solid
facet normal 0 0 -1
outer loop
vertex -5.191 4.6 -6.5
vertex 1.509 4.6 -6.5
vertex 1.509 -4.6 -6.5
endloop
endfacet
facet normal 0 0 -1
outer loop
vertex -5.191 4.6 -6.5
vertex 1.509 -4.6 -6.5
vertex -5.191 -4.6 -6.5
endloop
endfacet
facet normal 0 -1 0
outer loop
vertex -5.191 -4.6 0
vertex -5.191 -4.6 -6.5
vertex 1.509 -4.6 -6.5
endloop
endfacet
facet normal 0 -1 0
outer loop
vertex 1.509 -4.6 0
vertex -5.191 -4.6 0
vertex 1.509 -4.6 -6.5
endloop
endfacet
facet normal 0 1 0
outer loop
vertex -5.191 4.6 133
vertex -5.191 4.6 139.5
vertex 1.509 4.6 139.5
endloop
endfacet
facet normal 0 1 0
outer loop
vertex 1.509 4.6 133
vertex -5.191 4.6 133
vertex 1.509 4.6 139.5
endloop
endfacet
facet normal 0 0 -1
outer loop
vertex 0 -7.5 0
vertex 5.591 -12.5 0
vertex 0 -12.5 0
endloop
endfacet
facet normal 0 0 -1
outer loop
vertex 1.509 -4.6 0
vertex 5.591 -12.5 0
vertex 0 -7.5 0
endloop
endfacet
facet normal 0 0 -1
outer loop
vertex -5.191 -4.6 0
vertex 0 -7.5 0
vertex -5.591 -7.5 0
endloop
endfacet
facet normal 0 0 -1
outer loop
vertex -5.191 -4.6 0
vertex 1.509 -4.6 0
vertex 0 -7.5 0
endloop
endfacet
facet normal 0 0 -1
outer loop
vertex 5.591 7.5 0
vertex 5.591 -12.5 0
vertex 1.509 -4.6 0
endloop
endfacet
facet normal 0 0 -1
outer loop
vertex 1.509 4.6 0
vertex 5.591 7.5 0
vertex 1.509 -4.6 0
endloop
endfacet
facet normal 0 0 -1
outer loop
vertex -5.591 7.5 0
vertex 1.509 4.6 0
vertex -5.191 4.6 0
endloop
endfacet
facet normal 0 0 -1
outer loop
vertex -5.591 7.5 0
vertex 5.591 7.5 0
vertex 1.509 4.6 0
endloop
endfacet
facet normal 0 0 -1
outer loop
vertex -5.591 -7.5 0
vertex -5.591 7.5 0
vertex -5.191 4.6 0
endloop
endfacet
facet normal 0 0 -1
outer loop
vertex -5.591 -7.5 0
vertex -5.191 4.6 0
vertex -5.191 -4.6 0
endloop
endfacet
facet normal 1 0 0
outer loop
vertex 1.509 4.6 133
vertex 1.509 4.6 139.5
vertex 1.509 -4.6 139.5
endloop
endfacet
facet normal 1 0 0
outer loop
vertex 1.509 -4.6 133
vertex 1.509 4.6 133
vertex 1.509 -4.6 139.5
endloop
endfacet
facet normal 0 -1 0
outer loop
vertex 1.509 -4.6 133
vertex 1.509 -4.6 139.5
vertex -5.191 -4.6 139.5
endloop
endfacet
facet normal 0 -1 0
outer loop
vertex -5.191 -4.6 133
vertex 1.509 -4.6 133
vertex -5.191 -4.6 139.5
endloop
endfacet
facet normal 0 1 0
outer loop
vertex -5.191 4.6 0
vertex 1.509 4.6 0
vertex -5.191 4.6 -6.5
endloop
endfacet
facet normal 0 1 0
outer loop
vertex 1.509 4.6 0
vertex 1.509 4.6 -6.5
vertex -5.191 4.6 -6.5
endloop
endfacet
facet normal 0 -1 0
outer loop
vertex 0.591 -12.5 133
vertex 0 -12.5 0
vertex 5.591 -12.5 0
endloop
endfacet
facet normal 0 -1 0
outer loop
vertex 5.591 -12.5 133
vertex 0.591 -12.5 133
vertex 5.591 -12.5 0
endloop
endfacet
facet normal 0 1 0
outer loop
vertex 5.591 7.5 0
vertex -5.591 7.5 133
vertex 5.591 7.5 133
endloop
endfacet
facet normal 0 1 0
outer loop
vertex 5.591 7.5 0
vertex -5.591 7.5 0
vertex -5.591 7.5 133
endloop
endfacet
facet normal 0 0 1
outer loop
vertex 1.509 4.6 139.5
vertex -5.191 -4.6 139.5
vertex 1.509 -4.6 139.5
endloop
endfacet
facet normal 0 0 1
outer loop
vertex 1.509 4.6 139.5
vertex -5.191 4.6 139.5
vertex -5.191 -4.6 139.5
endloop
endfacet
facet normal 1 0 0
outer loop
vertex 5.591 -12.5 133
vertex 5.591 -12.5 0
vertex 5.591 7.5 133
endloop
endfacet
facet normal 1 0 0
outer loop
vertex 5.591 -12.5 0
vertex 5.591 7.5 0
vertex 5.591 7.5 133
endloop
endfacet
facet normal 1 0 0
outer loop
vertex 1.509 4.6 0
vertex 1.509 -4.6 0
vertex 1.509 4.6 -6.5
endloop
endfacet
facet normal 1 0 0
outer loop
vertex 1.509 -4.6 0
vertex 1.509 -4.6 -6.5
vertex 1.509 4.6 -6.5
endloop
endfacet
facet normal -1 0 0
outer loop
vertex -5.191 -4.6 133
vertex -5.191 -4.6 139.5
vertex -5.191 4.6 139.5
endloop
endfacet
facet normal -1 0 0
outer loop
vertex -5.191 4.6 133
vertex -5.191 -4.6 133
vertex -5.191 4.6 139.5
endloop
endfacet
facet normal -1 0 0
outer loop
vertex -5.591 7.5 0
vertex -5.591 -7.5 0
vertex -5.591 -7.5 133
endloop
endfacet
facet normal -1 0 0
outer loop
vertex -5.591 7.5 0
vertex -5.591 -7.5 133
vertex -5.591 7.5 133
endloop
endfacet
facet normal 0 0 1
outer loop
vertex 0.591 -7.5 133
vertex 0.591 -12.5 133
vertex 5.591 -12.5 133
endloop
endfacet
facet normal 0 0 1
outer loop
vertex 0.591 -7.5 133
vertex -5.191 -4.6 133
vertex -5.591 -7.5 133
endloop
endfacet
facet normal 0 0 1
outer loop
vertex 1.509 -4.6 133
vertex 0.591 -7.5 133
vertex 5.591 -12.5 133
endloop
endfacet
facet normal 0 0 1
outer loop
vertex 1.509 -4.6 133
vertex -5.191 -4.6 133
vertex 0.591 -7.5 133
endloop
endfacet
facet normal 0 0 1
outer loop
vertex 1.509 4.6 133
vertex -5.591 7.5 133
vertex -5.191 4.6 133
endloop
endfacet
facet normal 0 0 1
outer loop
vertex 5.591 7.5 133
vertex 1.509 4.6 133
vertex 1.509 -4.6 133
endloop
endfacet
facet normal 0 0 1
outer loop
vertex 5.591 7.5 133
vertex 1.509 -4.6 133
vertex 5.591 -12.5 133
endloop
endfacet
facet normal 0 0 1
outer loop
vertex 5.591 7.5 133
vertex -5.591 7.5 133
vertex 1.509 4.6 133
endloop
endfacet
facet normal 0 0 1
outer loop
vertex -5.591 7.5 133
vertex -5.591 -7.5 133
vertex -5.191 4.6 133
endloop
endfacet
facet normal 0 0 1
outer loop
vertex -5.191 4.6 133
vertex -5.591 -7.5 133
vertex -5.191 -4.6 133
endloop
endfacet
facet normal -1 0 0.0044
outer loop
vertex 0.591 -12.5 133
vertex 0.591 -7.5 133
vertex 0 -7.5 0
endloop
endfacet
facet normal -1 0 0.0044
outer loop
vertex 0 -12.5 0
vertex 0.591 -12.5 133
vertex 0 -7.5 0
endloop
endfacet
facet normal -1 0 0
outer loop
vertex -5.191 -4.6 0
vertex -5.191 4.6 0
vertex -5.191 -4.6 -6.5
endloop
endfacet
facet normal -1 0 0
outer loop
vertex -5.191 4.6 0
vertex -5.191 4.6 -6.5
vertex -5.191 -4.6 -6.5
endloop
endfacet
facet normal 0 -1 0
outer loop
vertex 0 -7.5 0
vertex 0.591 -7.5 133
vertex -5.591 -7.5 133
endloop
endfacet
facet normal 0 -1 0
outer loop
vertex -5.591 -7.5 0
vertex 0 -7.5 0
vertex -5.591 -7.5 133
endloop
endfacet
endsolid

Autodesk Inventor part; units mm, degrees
ref_plane "YZ Plane" through (0, 0, 0) normal (1, 0, 0) x (0, 1, 0)
ref_plane "XZ Plane" through (0, 0, 0) normal (0, 1, 0) x (-1, 0, 0)
ref_plane "XY Plane" through (0, 0, 0) normal (0, 0, 1) x (1, 0, 0)
sketch "Sketch1" plane through (0, 0, 0) normal (0, 0, 1) x (1, 0, 0)
  line L0 (-5.591, -7.5) -> (-5.591, 7.5)
  line L1 (-5.591, 7.5) -> (5.591, 7.5)
  line L2 (5.591, 7.5) -> (5.591, -7.5)
  line L3 (5.591, -7.5) -> (-5.591, -7.5)
  line L4 (-5.591, -7.5) -> (5.591, 7.5) construction
  line L5 (-5.591, 7.5) -> (5.591, -7.5) construction
  point P0 (0, 0)
  dimension "d0" = 15
  dimension "d1" = 11.182
extrude "Extrusion1" add sketch "Sketch1" along normal blind 133
sketch "Sketch2" plane through (0, 0, 133) normal (0, 0, 1) x (1, 0, 0)
  line L0 (-5.591, 7.5) -> (-5.591, -7.5) projected
  line L1 (-5.591, 0) -> (-5.591, -5)
  line L2 (-5.591, -5) -> (1.909, -5)
  line L3 (1.909, -5) -> (1.909, 5)
  line L4 (5.591, 7.5) -> (-5.591, 7.5) projected
  line L5 (1.909, 5) -> (-5.591, 5)
  line L6 (-5.591, 5) -> (-5.591, 0)
  point P0 (0, 0)
  dimension "d4" = 5
  dimension "d5" = 7.5
  dimension "d6" = 10
  dimension "d7" = 7.5
extrude "Extrusion2" add sketch "Sketch2" along normal blind 6.5
ref_plane "Work Plane1" through (0, 0, 66.5) normal (0, 0, 1) x (1, 0, 0)
mirror "Mirror1" about plane through (0, 0, 66.5) normal (0, 0, 1) of "Extrusion2"
sketch "Sketch3" plane through (-5.591, -7.5, 0) normal (0, -1, 0) x (1, 0, 0)
  line L0 (0, 133) -> (11.182, 133) projected
  line L1 (11.182, 133) -> (6.182, 133)
  line L2 (6.182, 133) -> (5.591, 0)
  line L3 (11.182, 0) -> (0, 0) projected
  line L4 (5.591, 0) -> (11.182, 0)
  line L5 (11.182, 0) -> (11.182, 133) projected
  line L6 (11.182, 0) -> (11.182, 133)
  line L7 (0, 0) -> (0, 133) projected
  dimension "d10" = 5
extrude "Extrusion3" add sketch "Sketch3" along normal blind 5 contours L0 L5 L3 L2
sketch "Sketch4" plane through (0, 0, 139.5) normal (0, 0, 1) x (1, 0, 0)
  line L0 (-5.591, 5) -> (-5.591, -5) projected
  line L1 (-5.591, -5) -> (1.909, -5) projected
  line L2 (1.909, -5) -> (1.909, 5) projected
  line L3 (1.909, 5) -> (-5.591, 5) projected
  line L4 (-5.191, -4.6) -> (-5.191, 4.6)
  line L5 (-5.191, 4.6) -> (1.509, 4.6)
  line L6 (1.509, 4.6) -> (1.509, -4.6)
  line L7 (1.509, -4.6) -> (-5.191, -4.6)
  point P0 (0, 0)
  dimension "d13" = 0.4
extrude "Extrusion4" cut sketch "Sketch4" against normal up to surface (6.5 mm away)
mirror "Mirror2" about plane through (0, 0, 66.5) normal (0, 0, 1) of "Extrusion4"
ref_plane "Work Plane2" through (0, 0, 66.5) normal (0, 0, 1) x (1, 0, 0)
properties part number "Lower Beam Support"
